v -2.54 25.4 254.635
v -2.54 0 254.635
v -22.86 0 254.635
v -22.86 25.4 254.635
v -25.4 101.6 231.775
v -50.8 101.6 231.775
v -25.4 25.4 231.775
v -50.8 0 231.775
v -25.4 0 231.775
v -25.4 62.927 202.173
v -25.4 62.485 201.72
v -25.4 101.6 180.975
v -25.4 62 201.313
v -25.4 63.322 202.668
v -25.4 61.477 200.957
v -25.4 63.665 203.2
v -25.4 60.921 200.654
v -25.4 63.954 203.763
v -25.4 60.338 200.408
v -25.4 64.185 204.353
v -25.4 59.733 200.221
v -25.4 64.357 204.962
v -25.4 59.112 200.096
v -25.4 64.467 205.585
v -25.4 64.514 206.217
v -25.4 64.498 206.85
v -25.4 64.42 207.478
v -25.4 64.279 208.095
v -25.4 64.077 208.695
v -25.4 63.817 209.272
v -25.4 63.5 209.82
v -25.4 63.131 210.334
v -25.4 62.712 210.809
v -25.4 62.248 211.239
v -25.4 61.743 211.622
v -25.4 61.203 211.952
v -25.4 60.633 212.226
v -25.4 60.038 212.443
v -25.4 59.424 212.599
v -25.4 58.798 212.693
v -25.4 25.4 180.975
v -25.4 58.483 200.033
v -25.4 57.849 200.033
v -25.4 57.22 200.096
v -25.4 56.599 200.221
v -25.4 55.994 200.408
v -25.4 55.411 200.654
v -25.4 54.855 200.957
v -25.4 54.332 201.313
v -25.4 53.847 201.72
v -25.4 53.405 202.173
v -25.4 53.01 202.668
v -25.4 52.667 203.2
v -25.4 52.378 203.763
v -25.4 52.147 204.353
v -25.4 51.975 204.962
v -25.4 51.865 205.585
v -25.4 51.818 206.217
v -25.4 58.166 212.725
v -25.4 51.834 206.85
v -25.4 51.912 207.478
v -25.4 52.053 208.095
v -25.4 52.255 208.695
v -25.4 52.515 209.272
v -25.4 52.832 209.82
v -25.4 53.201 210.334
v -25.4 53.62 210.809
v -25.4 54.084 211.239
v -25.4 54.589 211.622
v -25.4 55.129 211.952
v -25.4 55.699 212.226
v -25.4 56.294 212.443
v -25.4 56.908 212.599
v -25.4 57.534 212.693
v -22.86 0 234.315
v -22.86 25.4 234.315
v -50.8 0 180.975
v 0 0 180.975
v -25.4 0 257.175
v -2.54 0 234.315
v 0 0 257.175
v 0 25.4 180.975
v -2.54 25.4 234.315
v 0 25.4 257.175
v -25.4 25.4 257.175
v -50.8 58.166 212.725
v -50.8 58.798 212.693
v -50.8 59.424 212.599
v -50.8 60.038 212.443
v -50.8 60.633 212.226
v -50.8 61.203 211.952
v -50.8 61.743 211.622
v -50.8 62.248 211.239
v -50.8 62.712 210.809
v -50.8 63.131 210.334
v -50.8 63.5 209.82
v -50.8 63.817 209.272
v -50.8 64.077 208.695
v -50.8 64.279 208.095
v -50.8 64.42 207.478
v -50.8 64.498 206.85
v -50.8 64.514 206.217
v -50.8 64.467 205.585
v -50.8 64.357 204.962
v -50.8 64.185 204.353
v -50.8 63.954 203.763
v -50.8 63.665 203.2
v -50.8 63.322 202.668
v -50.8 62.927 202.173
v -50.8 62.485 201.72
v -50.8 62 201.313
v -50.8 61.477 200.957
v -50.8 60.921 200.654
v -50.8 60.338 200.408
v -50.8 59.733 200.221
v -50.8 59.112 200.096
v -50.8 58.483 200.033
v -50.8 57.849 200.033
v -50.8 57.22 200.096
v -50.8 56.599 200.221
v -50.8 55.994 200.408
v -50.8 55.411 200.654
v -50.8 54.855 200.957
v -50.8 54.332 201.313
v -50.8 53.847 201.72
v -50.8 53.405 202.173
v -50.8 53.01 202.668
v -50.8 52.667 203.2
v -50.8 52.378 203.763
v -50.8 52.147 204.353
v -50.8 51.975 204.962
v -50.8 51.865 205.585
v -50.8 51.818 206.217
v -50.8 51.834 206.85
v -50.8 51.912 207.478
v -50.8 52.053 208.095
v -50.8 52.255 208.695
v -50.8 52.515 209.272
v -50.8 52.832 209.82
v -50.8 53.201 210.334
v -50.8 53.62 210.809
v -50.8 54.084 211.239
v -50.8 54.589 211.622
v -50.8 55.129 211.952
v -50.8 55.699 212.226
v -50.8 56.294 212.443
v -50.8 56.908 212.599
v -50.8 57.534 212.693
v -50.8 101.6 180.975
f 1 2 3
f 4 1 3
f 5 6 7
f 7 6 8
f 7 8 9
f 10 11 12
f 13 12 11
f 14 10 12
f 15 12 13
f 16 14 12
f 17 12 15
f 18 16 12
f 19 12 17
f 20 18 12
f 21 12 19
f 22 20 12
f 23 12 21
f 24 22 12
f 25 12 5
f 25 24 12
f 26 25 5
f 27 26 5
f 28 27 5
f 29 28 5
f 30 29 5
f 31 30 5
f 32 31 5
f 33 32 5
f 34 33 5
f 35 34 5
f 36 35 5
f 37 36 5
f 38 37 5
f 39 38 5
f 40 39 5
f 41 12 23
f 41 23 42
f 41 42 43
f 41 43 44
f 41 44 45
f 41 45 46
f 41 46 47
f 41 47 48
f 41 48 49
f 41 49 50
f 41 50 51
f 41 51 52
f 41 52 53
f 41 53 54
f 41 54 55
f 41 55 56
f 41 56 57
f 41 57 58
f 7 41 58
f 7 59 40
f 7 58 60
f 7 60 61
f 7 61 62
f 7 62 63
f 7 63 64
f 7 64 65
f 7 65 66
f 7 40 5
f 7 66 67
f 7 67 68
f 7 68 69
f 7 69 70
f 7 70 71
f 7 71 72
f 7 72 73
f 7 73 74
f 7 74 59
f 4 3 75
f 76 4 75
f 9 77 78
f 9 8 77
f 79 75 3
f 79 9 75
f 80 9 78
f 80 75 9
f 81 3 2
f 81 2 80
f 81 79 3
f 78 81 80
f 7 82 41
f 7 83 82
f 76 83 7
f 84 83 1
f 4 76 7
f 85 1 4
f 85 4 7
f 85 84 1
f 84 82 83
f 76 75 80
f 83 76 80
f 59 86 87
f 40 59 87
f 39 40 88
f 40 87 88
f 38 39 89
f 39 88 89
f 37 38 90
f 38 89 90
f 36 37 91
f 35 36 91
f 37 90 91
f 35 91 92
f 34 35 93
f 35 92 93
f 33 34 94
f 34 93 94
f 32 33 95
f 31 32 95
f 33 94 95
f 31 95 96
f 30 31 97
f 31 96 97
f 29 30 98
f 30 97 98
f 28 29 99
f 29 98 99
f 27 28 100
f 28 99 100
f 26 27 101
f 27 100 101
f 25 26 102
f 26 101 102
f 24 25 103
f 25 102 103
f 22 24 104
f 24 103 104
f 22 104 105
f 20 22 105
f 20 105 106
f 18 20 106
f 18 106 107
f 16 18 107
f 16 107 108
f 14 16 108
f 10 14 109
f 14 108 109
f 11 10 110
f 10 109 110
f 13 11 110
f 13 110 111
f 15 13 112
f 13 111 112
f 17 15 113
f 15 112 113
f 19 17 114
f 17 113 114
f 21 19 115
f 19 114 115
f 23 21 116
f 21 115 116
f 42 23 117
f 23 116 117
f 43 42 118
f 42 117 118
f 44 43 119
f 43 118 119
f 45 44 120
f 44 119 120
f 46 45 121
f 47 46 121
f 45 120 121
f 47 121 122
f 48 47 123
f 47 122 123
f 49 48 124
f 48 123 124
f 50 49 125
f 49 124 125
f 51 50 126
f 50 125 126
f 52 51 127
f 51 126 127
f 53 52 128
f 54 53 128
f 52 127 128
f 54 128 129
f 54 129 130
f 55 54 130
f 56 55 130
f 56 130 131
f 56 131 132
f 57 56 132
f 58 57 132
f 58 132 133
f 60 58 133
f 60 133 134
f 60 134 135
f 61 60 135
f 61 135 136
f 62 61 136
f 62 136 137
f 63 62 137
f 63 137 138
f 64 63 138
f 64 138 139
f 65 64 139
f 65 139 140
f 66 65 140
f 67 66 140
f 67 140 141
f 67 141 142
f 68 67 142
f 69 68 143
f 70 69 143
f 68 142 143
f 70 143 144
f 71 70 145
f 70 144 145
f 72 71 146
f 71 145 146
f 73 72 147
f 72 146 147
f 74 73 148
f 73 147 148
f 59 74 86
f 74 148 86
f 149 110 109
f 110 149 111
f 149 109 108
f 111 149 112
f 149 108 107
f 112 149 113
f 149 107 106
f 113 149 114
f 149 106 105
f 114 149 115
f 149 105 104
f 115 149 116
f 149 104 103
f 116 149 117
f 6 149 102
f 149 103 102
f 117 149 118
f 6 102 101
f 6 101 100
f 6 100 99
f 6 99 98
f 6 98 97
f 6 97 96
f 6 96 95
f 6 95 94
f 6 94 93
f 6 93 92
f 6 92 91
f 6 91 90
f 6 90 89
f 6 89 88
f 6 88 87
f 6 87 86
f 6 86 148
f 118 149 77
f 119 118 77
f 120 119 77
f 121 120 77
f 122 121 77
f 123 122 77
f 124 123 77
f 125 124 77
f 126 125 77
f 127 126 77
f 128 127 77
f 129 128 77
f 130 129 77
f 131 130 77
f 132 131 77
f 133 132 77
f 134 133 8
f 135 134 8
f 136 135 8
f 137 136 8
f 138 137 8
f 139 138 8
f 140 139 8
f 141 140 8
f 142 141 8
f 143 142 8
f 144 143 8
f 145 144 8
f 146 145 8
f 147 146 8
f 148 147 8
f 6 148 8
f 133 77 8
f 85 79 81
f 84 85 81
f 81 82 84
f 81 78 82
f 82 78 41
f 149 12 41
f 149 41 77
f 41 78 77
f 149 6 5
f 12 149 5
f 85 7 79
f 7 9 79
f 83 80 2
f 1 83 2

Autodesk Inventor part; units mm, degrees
ref_plane "YZ Plane" through (0, 0, 0) normal (1, 0, 0) x (0, 1, 0)
ref_plane "XZ Plane" through (0, 0, 0) normal (0, 1, 0) x (-1, 0, 0)
ref_plane "XY Plane" through (0, 0, 0) normal (0, 0, 1) x (1, 0, 0)
sketch "Sketch1" plane through (0, 0, 0) normal (0, 1, 0) x (-1, 0, 0)
  line L0 (25.4, 231.775) -> (25.4, 257.175)
  line L1 (25.4, 257.175) -> (0, 257.175)
  line L2 (0, 231.775) -> (0, 257.175)
  line L3 (25.4, 231.775) -> (0, 231.775)
  line L4 (2.54, 234.315) -> (2.54, 254.635)
  line L5 (2.54, 254.635) -> (22.86, 254.635)
  line L6 (22.86, 254.635) -> (22.86, 234.315)
  line L7 (22.86, 234.315) -> (2.54, 234.315)
  line L8 (25.4, 231.775) -> (0, 231.775)
  line L9 (0, 231.775) -> (0, 180.975)
  line L10 (0, 180.975) -> (25.4, 180.975)
  line L11 (25.4, 180.975) -> (25.4, 231.775)
  line L12 (25.4, 231.775) -> (25.4, 257.175)
  line L13 (25.4, 257.175) -> (0, 257.175)
  line L14 (0, 231.775) -> (0, 257.175)
  line L15 (25.4, 231.775) -> (0, 231.775)
  line L16 (2.54, 234.315) -> (2.54, 254.635)
  line L17 (2.54, 254.635) -> (22.86, 254.635)
  line L18 (22.86, 254.635) -> (22.86, 234.315)
  line L19 (22.86, 234.315) -> (2.54, 234.315)
  line L20 (25.4, 231.775) -> (0, 231.775)
  line L21 (0, 231.775) -> (0, 180.975)
  line L22 (0, 180.975) -> (25.4, 180.975)
  line L23 (25.4, 180.975) -> (25.4, 231.775)
  point P0 (0, 0)
  dimension "d0" = 50.8
  dimension "d1" = 50.8
extrude "Extrusion1" add sketch "Sketch1" along normal blind 25.4
sketch "Sketch2" plane through (0, 0, 0) normal (0, -1, 0) x (1, 0, 0)
  line L0 (-25.4, 180.975) -> (-25.4, 257.175) projected
  line L1 (-25.4, 180.975) -> (-50.8, 180.975)
  line L2 (-50.8, 180.975) -> (-50.8, 231.775)
  line L3 (-50.8, 231.775) -> (-25.4, 231.775)
  line L4 (-25.4, 231.775) -> (-25.4, 180.975)
  point P0 (0, 0)
  dimension "d4" = 25.4
  dimension "d5" = 50.8
extrude "Extrusion2" add sketch "Sketch2" against normal blind 101.6
sketch "Sketch5" plane through (-50.8, 0, 180.975) normal (-1, 0, 0) x (0, 0, 1)
  circle A0 centre (25.4, 19.05) radius 6.35 construction
  line L0 (25.4, 19.05) -> (25.4, 58.166) construction
  circle A1 centre (25.4, 58.166) radius 6.35
  point P0 (-180.975, 0)
  dimension "d10" = 39.116
  dimension "d11" = 12.7
extrude "Extrusion4" cut sketch "Sketch5" against normal blind 25.4
properties part number "intakee mount"
